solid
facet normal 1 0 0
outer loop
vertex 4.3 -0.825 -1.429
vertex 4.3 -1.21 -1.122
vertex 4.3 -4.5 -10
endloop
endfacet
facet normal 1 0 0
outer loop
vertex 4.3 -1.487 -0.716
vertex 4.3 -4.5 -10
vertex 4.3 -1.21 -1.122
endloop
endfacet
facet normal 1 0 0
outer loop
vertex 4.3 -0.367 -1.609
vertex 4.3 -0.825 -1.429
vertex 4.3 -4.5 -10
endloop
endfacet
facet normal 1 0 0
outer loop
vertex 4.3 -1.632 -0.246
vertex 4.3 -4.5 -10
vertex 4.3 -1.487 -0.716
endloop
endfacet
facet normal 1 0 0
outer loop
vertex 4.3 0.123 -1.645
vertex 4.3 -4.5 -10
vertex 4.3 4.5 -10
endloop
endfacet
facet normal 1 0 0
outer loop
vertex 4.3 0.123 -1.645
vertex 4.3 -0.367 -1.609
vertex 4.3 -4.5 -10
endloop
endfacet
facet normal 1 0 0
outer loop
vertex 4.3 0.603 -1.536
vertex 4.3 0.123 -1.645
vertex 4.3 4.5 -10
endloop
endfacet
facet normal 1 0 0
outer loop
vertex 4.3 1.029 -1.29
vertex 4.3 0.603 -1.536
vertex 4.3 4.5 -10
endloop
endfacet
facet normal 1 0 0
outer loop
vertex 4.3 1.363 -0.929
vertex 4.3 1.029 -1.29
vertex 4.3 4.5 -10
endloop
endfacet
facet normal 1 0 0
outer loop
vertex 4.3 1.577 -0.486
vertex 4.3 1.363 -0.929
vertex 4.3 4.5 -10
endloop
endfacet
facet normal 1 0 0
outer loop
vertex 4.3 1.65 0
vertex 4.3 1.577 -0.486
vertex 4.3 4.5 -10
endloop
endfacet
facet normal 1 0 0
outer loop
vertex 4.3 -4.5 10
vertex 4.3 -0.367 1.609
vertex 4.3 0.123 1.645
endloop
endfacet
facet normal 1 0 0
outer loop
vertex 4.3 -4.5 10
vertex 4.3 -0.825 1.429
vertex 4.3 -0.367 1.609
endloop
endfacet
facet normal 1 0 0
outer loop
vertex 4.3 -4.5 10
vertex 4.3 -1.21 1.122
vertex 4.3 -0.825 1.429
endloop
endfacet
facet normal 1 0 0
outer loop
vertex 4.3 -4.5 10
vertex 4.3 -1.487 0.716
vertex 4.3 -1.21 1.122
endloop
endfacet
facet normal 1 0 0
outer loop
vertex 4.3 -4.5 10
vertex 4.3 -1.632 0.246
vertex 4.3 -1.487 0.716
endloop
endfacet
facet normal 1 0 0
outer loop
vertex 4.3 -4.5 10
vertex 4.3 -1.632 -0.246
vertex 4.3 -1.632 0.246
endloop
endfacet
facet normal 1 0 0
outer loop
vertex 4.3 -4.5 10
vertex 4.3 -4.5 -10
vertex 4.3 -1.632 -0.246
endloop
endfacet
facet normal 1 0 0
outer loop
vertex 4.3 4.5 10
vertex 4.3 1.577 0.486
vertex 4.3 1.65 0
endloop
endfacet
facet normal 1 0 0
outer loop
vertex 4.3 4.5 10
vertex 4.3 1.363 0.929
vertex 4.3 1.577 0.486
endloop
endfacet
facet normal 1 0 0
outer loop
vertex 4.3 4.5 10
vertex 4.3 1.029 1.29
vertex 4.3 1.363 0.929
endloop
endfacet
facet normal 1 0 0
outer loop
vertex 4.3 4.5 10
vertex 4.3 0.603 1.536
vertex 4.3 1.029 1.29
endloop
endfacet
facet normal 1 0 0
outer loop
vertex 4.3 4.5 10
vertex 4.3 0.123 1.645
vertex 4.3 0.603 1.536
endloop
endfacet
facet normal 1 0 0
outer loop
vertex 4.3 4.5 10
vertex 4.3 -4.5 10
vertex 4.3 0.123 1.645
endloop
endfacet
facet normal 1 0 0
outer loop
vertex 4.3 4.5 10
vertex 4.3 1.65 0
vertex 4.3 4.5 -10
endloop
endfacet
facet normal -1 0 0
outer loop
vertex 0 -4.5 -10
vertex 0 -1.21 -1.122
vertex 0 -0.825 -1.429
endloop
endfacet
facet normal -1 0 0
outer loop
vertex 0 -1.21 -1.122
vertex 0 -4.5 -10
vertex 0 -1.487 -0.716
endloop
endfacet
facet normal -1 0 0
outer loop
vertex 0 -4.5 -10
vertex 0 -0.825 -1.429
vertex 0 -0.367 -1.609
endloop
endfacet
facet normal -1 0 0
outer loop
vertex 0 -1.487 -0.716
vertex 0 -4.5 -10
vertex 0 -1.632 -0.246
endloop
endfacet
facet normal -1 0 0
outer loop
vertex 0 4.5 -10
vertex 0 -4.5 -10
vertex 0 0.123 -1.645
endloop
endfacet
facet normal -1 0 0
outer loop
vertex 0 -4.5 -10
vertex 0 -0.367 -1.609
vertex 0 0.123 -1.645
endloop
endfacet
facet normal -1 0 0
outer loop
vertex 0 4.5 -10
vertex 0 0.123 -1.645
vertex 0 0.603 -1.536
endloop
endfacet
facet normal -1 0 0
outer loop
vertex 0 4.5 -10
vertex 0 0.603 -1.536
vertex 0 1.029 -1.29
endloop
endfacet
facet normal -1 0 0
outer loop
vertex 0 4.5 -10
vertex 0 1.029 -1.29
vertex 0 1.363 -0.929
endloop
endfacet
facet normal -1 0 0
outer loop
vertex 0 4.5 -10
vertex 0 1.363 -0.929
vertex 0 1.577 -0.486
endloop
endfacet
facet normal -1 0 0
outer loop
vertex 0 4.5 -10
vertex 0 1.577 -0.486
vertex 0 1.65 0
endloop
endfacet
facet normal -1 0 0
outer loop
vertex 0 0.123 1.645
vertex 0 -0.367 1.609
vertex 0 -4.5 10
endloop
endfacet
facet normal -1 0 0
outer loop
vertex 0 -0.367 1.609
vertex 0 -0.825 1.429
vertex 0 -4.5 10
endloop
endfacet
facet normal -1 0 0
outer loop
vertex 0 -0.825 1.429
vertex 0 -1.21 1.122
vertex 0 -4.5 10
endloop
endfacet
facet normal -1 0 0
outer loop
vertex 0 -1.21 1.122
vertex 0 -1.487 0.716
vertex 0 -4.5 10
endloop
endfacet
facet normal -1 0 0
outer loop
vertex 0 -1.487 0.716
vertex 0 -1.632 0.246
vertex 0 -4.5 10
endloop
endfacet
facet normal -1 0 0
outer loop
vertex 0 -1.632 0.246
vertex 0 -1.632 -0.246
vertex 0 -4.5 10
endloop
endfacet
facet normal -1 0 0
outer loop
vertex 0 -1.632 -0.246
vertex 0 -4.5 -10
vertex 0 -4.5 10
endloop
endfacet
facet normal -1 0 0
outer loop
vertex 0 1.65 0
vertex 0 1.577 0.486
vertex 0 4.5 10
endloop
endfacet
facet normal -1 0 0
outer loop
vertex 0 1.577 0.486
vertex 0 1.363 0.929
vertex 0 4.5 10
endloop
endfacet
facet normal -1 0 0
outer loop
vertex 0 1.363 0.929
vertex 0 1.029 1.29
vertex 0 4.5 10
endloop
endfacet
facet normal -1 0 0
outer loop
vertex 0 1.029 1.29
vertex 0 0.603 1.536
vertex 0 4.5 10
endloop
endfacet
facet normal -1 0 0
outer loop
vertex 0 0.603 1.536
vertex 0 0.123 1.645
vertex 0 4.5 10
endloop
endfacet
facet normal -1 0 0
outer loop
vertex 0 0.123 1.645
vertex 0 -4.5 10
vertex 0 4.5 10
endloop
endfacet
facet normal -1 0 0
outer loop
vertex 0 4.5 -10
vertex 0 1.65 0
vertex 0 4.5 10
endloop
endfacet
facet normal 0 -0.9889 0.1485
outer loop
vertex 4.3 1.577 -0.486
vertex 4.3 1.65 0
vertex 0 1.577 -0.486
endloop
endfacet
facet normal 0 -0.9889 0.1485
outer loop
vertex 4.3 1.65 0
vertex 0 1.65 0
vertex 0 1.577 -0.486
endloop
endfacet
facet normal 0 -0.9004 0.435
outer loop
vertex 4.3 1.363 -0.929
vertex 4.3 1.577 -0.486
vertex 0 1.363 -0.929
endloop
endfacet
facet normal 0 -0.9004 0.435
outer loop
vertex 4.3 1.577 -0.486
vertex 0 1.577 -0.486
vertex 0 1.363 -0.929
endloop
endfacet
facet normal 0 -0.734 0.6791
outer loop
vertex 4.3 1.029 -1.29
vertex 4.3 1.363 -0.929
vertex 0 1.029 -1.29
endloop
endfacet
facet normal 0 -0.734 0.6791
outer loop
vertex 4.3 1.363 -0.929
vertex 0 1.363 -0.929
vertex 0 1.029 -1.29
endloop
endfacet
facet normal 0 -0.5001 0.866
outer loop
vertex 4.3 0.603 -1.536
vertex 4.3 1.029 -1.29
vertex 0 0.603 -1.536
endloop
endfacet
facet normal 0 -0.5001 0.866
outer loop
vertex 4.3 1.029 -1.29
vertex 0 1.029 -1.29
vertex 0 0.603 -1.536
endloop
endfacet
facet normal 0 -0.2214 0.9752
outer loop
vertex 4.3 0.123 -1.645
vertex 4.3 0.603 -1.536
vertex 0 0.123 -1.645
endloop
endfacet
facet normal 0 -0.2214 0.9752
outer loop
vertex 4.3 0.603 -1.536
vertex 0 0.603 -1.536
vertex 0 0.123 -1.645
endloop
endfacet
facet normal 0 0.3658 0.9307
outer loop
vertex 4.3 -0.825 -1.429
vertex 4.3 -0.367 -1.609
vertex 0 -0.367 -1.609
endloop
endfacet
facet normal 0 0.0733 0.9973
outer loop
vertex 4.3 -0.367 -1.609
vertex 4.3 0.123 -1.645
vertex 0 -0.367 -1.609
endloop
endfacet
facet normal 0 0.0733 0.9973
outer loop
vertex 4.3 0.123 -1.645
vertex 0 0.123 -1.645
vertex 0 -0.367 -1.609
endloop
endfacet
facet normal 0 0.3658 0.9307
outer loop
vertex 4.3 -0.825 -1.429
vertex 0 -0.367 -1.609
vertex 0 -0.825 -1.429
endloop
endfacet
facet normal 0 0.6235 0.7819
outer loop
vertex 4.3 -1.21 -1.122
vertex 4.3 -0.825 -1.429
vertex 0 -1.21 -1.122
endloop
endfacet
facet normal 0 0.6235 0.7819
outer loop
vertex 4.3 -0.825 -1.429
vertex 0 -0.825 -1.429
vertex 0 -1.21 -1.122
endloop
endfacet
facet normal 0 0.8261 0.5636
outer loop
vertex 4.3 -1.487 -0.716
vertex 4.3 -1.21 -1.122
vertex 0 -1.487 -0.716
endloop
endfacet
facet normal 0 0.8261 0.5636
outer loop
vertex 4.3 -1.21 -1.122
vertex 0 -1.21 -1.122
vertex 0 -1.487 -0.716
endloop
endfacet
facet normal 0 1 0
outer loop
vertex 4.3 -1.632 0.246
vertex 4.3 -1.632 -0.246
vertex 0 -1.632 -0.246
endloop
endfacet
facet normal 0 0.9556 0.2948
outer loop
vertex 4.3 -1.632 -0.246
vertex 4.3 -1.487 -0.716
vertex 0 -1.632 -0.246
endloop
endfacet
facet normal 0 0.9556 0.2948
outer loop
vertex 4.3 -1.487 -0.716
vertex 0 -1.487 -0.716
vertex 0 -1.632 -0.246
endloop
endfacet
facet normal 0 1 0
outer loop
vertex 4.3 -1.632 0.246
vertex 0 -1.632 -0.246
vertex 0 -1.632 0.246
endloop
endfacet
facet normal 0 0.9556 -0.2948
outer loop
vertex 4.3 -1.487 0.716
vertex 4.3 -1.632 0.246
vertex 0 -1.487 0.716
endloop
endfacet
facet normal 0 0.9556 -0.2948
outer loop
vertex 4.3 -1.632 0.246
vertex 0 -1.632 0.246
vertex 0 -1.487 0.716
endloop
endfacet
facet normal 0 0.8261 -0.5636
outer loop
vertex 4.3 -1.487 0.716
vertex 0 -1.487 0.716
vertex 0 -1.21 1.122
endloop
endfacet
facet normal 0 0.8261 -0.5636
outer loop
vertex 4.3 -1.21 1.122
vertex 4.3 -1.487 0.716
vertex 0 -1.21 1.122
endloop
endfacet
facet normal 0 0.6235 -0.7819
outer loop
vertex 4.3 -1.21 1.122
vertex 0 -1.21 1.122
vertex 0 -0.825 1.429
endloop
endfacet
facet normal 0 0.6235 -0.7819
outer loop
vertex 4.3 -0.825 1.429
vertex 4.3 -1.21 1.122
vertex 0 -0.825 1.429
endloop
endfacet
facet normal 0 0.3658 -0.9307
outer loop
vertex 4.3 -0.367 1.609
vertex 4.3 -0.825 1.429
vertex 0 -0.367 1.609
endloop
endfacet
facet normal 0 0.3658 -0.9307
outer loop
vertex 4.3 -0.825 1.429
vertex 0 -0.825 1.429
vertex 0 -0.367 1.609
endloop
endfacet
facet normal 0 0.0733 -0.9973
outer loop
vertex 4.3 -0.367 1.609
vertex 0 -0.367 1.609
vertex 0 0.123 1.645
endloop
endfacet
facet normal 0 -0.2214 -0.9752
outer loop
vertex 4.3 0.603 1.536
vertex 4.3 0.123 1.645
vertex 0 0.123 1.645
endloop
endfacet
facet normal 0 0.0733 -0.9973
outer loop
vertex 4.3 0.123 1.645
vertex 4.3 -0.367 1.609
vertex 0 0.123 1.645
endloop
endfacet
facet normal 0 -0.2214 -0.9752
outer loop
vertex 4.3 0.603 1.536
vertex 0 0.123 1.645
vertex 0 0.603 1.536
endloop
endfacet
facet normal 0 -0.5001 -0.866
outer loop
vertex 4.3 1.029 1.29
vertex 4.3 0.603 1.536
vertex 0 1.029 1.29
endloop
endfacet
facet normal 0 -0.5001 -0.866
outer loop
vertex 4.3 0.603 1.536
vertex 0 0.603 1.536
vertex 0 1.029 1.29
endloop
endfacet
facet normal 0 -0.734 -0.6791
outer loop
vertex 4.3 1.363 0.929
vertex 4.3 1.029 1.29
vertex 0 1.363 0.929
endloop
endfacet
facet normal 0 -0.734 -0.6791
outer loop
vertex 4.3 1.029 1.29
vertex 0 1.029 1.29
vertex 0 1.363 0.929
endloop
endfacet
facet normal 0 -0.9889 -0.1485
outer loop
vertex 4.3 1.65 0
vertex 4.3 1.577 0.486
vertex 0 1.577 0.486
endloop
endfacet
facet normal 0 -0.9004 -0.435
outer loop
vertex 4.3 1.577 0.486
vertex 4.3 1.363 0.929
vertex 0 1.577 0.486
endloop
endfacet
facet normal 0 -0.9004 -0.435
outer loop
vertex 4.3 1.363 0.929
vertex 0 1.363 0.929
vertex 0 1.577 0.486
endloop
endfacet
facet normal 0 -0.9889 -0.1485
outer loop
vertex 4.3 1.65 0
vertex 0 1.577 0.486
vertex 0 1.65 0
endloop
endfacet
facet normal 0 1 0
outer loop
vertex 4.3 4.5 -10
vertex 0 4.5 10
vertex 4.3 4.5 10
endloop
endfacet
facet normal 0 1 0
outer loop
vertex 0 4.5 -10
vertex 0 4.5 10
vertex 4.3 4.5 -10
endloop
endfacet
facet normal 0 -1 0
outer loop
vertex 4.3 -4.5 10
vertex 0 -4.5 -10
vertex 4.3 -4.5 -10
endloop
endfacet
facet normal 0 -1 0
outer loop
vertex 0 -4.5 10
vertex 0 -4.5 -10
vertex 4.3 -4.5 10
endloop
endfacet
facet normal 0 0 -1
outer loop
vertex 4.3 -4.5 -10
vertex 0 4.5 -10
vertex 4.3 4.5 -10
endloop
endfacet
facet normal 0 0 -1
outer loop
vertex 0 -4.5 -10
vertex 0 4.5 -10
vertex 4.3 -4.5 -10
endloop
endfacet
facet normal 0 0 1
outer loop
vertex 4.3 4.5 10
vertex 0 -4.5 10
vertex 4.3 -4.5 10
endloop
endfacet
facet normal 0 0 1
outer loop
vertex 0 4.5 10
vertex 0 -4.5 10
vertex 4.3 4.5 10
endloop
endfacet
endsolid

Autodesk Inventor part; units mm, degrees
ref_plane "YZ Plane" through (0, 0, 0) normal (1, 0, 0) x (0, 1, 0)
ref_plane "XZ Plane" through (0, 0, 0) normal (0, 1, 0) x (-1, 0, 0)
ref_plane "XY Plane" through (0, 0, 0) normal (0, 0, 1) x (1, 0, 0)
sketch "Sketch1" plane through (0, 0, 0) normal (1, 0, 0) x (0, 1, 0)
  line L0 (-4.5, 10) -> (4.5, 10)
  line L1 (4.5, 10) -> (4.5, -10)
  line L2 (4.5, -10) -> (-4.5, -10)
  line L3 (-4.5, -10) -> (-4.5, 10)
  line L4 (-4.5, 10) -> (4.5, -10) construction
  line L5 (4.5, 10) -> (-4.5, -10) construction
  circle A0 centre (0, 0) radius 1.65
  point P0 (0, 0)
  dimension "d0" = 9
  dimension "d1" = 20
  dimension "d2" = 3.3
extrude "Extrusion1" add sketch "Sketch1" along normal blind 4.3
properties part number "GPU Clamp"
